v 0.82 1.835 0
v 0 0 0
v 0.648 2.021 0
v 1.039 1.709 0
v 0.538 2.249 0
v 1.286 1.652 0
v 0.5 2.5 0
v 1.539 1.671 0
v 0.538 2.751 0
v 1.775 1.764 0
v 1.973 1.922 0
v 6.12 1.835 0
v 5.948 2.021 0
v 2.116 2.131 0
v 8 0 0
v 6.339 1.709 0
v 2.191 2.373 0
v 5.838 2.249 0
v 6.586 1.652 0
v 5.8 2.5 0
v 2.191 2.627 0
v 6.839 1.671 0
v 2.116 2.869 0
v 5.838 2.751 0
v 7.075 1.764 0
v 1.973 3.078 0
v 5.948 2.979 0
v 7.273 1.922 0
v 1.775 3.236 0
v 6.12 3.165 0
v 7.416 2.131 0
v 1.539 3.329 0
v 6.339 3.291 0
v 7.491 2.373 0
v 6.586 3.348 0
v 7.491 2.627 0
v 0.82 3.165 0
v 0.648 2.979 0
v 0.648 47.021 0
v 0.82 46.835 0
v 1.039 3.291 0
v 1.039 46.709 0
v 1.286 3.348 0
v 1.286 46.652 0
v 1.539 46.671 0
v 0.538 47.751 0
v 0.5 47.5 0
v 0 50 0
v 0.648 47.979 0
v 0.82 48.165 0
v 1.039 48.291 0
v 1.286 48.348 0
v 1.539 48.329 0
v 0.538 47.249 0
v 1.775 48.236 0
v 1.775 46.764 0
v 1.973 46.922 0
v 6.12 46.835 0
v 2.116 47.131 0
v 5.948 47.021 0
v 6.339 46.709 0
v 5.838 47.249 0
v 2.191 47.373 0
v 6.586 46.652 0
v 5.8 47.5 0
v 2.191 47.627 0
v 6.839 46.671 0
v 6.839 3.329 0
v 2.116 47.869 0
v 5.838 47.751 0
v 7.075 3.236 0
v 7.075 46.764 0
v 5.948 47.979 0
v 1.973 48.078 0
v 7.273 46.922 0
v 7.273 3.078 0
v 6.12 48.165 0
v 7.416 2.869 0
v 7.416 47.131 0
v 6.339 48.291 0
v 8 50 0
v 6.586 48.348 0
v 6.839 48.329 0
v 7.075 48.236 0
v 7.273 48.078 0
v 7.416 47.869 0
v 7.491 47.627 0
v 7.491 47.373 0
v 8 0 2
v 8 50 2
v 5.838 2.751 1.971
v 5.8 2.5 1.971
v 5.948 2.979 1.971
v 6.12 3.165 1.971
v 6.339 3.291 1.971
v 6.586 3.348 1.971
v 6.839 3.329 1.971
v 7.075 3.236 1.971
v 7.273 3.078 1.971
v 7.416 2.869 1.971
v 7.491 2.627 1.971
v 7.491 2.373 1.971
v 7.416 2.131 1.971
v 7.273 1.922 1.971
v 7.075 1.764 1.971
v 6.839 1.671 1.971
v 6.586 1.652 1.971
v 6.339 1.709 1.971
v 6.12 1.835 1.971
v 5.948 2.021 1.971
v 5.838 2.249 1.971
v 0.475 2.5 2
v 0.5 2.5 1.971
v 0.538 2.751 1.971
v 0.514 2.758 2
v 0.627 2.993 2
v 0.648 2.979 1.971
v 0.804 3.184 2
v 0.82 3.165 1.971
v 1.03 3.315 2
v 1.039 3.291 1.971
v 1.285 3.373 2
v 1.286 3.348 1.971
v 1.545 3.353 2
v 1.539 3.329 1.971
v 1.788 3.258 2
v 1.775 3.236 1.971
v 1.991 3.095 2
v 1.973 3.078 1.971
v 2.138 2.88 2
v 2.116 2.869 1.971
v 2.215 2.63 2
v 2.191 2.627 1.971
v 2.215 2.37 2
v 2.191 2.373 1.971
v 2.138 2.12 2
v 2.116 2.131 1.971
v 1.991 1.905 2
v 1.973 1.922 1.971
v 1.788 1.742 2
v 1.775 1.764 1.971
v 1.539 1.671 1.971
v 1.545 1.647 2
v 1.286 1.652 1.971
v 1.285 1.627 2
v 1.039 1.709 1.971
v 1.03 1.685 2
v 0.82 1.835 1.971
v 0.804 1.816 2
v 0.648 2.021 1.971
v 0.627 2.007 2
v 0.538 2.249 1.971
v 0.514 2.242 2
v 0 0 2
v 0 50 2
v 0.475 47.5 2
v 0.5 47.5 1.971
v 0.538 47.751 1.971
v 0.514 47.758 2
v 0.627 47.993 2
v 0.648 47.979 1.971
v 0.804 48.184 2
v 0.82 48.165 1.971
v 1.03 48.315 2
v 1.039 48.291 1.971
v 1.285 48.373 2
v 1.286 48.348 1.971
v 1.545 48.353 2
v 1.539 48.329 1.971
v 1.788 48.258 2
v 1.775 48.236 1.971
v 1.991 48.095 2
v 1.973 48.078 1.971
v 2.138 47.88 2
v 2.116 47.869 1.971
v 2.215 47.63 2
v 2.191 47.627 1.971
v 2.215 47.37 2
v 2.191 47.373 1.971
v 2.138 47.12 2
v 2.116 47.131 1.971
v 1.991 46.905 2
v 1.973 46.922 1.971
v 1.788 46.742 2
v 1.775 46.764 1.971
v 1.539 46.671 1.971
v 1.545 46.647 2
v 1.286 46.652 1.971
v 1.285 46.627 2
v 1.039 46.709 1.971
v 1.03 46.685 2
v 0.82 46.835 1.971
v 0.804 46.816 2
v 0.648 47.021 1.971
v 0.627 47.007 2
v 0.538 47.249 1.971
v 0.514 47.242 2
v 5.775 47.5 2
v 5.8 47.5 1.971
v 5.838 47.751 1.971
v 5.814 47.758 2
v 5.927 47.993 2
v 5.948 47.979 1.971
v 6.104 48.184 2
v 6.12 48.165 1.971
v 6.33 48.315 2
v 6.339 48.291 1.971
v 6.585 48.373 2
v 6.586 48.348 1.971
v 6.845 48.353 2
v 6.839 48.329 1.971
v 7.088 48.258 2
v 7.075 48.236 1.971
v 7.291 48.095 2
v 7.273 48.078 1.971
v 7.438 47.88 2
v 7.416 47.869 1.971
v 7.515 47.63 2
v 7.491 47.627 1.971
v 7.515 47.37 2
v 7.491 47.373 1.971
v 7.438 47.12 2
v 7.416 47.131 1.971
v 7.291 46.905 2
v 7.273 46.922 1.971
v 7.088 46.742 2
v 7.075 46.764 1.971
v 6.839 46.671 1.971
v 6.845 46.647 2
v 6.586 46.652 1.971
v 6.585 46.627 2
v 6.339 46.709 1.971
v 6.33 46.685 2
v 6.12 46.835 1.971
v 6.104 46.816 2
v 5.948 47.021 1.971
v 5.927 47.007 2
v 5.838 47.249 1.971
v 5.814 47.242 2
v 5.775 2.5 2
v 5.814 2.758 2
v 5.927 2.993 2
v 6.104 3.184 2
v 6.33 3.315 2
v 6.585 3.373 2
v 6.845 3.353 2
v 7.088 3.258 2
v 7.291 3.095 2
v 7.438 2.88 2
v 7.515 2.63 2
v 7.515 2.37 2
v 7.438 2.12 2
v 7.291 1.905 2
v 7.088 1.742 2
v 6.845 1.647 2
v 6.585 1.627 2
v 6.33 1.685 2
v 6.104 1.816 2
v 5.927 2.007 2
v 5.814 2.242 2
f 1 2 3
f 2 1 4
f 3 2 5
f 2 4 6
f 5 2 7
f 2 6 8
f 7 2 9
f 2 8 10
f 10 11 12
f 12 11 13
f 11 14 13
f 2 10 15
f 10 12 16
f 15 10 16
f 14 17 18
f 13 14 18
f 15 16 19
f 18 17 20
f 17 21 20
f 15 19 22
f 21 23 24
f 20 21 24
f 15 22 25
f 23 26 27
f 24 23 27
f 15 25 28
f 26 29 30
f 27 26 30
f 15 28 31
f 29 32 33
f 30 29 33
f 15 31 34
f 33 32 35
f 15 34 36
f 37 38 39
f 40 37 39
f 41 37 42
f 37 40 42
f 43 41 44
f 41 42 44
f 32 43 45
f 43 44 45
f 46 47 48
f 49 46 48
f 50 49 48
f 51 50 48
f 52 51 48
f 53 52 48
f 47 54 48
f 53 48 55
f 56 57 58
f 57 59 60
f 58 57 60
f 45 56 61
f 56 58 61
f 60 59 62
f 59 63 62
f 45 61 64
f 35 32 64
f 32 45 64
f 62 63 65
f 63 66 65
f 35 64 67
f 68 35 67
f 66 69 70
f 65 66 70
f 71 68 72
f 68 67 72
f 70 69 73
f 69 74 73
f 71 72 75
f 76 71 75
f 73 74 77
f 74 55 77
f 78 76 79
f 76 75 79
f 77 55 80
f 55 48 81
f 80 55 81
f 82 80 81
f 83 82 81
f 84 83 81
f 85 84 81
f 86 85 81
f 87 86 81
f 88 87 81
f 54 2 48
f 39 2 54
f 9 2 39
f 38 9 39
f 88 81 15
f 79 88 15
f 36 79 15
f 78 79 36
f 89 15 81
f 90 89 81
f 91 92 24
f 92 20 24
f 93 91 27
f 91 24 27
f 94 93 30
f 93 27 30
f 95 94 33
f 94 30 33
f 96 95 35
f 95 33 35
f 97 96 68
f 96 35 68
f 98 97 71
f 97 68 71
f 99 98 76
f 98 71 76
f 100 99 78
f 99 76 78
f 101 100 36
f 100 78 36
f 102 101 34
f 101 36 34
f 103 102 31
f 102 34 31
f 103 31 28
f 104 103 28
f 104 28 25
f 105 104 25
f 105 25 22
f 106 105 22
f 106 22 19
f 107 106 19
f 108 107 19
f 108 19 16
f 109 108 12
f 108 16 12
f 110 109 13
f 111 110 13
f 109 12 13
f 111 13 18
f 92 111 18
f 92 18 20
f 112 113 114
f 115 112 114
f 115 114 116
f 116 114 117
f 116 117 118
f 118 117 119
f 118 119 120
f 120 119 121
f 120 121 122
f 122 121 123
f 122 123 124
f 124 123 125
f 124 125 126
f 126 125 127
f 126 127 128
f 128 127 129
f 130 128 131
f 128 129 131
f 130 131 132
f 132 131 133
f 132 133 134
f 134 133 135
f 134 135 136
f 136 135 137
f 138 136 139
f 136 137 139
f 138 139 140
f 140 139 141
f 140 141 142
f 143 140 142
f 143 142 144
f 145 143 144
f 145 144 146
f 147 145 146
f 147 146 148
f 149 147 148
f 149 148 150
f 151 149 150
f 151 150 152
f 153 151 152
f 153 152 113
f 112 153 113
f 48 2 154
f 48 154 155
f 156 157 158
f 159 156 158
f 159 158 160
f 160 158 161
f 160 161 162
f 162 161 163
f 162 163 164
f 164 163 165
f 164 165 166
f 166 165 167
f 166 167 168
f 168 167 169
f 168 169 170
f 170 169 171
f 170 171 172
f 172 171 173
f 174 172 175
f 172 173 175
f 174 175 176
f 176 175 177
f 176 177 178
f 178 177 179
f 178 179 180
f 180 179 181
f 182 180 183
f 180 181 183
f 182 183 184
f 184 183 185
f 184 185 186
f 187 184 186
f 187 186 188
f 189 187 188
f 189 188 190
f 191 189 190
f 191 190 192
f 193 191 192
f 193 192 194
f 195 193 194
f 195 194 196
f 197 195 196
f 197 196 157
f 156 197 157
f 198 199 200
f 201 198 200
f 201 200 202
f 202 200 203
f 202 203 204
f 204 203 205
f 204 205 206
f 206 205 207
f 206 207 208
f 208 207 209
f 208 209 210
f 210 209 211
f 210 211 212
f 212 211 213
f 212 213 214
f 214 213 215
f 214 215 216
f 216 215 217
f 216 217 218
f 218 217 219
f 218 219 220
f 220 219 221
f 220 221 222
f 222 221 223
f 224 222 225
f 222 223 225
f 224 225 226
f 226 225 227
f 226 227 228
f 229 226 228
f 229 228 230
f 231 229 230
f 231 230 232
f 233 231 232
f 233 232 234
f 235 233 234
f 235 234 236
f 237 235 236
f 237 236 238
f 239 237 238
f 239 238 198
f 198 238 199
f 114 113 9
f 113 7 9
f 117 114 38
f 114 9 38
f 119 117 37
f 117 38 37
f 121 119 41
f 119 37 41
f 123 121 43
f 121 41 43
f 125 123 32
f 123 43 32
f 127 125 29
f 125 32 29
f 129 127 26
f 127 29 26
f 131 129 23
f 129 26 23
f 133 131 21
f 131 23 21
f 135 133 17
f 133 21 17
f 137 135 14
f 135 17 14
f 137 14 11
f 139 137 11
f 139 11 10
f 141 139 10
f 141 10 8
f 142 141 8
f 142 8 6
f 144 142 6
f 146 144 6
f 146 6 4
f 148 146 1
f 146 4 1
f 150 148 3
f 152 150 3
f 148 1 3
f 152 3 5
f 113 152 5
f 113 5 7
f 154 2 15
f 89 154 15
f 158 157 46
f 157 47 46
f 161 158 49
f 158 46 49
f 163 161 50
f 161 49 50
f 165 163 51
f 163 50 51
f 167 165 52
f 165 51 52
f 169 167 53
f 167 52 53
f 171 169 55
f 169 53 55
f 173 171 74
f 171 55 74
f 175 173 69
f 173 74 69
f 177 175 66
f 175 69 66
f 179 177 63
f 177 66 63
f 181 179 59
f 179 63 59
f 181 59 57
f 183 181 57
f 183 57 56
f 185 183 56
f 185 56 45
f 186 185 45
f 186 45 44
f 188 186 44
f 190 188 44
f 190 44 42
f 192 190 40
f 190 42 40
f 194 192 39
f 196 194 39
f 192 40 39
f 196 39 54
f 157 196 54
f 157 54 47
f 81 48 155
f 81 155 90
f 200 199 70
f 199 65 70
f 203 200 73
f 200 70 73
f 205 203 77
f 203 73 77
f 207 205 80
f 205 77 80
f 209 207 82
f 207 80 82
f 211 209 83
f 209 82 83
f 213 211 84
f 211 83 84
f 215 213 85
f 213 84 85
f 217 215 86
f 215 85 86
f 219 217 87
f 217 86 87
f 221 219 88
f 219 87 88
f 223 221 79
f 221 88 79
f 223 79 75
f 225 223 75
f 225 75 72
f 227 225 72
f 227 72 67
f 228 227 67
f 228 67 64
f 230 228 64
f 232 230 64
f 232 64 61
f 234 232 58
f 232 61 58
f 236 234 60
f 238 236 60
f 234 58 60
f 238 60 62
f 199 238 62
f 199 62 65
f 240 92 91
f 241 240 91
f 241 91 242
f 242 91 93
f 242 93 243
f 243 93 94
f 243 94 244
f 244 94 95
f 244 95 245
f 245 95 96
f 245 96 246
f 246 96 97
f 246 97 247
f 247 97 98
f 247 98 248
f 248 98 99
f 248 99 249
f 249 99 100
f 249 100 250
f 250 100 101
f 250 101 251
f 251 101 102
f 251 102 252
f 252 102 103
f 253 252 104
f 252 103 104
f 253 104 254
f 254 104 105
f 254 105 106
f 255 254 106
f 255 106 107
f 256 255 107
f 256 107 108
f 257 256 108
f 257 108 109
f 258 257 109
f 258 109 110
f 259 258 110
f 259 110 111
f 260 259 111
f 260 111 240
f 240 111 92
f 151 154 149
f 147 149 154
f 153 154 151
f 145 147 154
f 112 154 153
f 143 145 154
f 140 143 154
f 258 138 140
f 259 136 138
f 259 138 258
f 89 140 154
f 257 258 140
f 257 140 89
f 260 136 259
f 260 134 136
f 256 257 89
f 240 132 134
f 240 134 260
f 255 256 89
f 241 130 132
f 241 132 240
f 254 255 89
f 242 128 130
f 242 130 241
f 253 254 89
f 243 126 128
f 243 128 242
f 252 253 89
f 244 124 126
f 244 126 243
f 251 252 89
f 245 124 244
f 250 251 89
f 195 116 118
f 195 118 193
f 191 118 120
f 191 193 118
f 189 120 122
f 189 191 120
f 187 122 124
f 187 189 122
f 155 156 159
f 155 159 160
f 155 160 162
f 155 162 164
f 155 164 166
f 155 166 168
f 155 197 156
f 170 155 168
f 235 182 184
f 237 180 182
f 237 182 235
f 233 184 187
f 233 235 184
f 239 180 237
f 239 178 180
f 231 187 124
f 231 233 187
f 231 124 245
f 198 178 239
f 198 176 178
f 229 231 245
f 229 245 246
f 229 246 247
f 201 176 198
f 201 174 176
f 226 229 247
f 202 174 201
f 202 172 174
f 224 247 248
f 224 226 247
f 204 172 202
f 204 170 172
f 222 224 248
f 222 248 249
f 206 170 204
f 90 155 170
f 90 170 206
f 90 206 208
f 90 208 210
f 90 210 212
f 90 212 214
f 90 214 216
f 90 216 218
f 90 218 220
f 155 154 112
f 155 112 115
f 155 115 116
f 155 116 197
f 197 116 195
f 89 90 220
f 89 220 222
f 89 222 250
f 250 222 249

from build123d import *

# Parameters (mm, degrees)
CROQUIS1_W                               = 8
CROQUIS1_H                               = 50
SALIENTE_EXTRUIR1_DEPTH                  = 2
TALADRO_DE_MARGEN_PARA_M1_61_D           = 1.7
TALADRO_DE_MARGEN_PARA_M1_61_CSINK_D     = 1.75
TALADRO_DE_MARGEN_PARA_M1_61_CSINK_ANGLE = 82
TALADRO_DE_MARGEN_PARA_M1_62_D           = 1.7
TALADRO_DE_MARGEN_PARA_M1_62_CSINK_D     = 1.75
TALADRO_DE_MARGEN_PARA_M1_62_CSINK_ANGLE = 82


with BuildPart() as part:
    # Croquis1 → Saliente-Extruir1 (new body)
    with BuildSketch(Plane.XY):
        with Locations((4, 25)):
            Rectangle(CROQUIS1_W, CROQUIS1_H)
    extrude(amount=SALIENTE_EXTRUIR1_DEPTH)

    # Taladro de margen para M1.61 (through all)
    with Locations(Plane.XY.offset(2)):
        with Locations((1.35, 47.5), (6.65, 47.5)):
            CounterSinkHole(TALADRO_DE_MARGEN_PARA_M1_61_D / 2, TALADRO_DE_MARGEN_PARA_M1_61_CSINK_D / 2, counter_sink_angle=TALADRO_DE_MARGEN_PARA_M1_61_CSINK_ANGLE)

    # Taladro de margen para M1.62 (through all)
    with Locations(Plane.XY.offset(2)):
        with Locations((1.35, 2.5), (6.65, 2.5)):
            CounterSinkHole(TALADRO_DE_MARGEN_PARA_M1_62_D / 2, TALADRO_DE_MARGEN_PARA_M1_62_CSINK_D / 2, counter_sink_angle=TALADRO_DE_MARGEN_PARA_M1_62_CSINK_ANGLE)


solid = part.part
